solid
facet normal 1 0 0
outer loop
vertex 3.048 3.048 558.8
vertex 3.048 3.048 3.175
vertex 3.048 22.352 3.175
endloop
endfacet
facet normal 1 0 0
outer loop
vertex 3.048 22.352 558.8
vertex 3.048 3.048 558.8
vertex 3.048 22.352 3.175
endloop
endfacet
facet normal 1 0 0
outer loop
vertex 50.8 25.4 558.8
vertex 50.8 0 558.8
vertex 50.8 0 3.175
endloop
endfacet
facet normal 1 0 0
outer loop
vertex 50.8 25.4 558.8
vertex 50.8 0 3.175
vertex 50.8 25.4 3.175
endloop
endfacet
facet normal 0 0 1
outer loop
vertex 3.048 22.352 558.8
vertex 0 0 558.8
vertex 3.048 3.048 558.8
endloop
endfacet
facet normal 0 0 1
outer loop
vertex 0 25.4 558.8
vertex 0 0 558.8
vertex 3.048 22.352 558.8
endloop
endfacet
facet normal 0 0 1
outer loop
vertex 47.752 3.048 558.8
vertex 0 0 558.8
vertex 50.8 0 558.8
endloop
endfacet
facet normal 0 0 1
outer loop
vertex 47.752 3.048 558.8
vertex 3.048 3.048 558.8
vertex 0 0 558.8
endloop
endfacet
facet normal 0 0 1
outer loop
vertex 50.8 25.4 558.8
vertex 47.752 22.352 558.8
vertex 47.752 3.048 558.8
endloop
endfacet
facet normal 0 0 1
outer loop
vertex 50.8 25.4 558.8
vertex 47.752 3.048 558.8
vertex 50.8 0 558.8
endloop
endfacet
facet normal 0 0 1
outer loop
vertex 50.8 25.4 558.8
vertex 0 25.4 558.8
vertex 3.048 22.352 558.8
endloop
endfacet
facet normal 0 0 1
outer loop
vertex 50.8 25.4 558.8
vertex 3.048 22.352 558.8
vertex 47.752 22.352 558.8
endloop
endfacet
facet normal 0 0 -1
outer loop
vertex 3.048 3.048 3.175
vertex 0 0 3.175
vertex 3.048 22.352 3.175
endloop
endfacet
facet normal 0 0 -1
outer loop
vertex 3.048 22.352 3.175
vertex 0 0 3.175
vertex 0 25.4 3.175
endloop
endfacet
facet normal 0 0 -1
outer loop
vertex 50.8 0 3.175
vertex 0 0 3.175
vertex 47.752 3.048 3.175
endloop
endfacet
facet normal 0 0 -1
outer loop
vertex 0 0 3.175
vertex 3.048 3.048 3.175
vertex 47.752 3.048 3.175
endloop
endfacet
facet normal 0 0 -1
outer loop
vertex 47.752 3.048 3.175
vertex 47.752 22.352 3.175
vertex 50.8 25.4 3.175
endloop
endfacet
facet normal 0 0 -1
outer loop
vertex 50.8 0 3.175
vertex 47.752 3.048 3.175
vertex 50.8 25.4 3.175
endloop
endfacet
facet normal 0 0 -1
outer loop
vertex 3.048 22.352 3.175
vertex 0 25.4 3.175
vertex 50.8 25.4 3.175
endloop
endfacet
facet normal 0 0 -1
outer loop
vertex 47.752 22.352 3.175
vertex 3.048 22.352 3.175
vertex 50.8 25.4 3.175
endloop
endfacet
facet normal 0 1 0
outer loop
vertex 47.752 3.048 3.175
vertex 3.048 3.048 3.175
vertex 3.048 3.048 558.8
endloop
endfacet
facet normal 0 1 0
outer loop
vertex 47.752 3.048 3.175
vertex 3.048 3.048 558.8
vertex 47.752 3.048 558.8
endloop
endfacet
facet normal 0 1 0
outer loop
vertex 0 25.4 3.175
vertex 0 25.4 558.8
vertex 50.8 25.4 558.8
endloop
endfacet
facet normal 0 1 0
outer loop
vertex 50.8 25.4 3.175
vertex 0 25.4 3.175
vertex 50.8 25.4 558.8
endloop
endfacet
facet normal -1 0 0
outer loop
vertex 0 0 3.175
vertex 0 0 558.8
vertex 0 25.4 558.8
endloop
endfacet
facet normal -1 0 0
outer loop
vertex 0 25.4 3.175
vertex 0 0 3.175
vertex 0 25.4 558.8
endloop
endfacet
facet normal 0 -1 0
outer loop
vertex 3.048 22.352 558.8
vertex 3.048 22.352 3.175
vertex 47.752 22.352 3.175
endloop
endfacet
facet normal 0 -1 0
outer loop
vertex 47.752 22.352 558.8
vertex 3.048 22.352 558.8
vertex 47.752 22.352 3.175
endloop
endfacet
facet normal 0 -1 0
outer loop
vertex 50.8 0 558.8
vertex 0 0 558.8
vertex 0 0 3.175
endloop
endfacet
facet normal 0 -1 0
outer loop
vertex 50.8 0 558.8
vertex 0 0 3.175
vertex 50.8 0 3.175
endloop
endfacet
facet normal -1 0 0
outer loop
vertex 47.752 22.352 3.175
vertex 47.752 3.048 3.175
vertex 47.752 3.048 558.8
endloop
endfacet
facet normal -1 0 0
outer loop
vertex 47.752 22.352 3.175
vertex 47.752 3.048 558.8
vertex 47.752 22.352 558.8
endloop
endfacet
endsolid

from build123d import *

# Parameters (mm, degrees)
BOSS_EXTRUDE1_START = 3.175
SKETCH1_W           = 50.8
SKETCH1_H           = 25.4
SKETCH1_W_2         = 44.704
SKETCH1_H_2         = 19.304
BOSS_EXTRUDE1_DEPTH = 555.625


with BuildPart() as part:
    # Sketch1 → Boss-Extrude1 (new body)
    with BuildSketch(Plane.XY.offset(BOSS_EXTRUDE1_START)):
        with Locations((25.4, 12.7)):
            Rectangle(SKETCH1_W, SKETCH1_H)
        with Locations((25.4, 12.7)):
            Rectangle(SKETCH1_W_2, SKETCH1_H_2, mode=Mode.SUBTRACT)
    extrude(amount=BOSS_EXTRUDE1_DEPTH)


solid = part.part
